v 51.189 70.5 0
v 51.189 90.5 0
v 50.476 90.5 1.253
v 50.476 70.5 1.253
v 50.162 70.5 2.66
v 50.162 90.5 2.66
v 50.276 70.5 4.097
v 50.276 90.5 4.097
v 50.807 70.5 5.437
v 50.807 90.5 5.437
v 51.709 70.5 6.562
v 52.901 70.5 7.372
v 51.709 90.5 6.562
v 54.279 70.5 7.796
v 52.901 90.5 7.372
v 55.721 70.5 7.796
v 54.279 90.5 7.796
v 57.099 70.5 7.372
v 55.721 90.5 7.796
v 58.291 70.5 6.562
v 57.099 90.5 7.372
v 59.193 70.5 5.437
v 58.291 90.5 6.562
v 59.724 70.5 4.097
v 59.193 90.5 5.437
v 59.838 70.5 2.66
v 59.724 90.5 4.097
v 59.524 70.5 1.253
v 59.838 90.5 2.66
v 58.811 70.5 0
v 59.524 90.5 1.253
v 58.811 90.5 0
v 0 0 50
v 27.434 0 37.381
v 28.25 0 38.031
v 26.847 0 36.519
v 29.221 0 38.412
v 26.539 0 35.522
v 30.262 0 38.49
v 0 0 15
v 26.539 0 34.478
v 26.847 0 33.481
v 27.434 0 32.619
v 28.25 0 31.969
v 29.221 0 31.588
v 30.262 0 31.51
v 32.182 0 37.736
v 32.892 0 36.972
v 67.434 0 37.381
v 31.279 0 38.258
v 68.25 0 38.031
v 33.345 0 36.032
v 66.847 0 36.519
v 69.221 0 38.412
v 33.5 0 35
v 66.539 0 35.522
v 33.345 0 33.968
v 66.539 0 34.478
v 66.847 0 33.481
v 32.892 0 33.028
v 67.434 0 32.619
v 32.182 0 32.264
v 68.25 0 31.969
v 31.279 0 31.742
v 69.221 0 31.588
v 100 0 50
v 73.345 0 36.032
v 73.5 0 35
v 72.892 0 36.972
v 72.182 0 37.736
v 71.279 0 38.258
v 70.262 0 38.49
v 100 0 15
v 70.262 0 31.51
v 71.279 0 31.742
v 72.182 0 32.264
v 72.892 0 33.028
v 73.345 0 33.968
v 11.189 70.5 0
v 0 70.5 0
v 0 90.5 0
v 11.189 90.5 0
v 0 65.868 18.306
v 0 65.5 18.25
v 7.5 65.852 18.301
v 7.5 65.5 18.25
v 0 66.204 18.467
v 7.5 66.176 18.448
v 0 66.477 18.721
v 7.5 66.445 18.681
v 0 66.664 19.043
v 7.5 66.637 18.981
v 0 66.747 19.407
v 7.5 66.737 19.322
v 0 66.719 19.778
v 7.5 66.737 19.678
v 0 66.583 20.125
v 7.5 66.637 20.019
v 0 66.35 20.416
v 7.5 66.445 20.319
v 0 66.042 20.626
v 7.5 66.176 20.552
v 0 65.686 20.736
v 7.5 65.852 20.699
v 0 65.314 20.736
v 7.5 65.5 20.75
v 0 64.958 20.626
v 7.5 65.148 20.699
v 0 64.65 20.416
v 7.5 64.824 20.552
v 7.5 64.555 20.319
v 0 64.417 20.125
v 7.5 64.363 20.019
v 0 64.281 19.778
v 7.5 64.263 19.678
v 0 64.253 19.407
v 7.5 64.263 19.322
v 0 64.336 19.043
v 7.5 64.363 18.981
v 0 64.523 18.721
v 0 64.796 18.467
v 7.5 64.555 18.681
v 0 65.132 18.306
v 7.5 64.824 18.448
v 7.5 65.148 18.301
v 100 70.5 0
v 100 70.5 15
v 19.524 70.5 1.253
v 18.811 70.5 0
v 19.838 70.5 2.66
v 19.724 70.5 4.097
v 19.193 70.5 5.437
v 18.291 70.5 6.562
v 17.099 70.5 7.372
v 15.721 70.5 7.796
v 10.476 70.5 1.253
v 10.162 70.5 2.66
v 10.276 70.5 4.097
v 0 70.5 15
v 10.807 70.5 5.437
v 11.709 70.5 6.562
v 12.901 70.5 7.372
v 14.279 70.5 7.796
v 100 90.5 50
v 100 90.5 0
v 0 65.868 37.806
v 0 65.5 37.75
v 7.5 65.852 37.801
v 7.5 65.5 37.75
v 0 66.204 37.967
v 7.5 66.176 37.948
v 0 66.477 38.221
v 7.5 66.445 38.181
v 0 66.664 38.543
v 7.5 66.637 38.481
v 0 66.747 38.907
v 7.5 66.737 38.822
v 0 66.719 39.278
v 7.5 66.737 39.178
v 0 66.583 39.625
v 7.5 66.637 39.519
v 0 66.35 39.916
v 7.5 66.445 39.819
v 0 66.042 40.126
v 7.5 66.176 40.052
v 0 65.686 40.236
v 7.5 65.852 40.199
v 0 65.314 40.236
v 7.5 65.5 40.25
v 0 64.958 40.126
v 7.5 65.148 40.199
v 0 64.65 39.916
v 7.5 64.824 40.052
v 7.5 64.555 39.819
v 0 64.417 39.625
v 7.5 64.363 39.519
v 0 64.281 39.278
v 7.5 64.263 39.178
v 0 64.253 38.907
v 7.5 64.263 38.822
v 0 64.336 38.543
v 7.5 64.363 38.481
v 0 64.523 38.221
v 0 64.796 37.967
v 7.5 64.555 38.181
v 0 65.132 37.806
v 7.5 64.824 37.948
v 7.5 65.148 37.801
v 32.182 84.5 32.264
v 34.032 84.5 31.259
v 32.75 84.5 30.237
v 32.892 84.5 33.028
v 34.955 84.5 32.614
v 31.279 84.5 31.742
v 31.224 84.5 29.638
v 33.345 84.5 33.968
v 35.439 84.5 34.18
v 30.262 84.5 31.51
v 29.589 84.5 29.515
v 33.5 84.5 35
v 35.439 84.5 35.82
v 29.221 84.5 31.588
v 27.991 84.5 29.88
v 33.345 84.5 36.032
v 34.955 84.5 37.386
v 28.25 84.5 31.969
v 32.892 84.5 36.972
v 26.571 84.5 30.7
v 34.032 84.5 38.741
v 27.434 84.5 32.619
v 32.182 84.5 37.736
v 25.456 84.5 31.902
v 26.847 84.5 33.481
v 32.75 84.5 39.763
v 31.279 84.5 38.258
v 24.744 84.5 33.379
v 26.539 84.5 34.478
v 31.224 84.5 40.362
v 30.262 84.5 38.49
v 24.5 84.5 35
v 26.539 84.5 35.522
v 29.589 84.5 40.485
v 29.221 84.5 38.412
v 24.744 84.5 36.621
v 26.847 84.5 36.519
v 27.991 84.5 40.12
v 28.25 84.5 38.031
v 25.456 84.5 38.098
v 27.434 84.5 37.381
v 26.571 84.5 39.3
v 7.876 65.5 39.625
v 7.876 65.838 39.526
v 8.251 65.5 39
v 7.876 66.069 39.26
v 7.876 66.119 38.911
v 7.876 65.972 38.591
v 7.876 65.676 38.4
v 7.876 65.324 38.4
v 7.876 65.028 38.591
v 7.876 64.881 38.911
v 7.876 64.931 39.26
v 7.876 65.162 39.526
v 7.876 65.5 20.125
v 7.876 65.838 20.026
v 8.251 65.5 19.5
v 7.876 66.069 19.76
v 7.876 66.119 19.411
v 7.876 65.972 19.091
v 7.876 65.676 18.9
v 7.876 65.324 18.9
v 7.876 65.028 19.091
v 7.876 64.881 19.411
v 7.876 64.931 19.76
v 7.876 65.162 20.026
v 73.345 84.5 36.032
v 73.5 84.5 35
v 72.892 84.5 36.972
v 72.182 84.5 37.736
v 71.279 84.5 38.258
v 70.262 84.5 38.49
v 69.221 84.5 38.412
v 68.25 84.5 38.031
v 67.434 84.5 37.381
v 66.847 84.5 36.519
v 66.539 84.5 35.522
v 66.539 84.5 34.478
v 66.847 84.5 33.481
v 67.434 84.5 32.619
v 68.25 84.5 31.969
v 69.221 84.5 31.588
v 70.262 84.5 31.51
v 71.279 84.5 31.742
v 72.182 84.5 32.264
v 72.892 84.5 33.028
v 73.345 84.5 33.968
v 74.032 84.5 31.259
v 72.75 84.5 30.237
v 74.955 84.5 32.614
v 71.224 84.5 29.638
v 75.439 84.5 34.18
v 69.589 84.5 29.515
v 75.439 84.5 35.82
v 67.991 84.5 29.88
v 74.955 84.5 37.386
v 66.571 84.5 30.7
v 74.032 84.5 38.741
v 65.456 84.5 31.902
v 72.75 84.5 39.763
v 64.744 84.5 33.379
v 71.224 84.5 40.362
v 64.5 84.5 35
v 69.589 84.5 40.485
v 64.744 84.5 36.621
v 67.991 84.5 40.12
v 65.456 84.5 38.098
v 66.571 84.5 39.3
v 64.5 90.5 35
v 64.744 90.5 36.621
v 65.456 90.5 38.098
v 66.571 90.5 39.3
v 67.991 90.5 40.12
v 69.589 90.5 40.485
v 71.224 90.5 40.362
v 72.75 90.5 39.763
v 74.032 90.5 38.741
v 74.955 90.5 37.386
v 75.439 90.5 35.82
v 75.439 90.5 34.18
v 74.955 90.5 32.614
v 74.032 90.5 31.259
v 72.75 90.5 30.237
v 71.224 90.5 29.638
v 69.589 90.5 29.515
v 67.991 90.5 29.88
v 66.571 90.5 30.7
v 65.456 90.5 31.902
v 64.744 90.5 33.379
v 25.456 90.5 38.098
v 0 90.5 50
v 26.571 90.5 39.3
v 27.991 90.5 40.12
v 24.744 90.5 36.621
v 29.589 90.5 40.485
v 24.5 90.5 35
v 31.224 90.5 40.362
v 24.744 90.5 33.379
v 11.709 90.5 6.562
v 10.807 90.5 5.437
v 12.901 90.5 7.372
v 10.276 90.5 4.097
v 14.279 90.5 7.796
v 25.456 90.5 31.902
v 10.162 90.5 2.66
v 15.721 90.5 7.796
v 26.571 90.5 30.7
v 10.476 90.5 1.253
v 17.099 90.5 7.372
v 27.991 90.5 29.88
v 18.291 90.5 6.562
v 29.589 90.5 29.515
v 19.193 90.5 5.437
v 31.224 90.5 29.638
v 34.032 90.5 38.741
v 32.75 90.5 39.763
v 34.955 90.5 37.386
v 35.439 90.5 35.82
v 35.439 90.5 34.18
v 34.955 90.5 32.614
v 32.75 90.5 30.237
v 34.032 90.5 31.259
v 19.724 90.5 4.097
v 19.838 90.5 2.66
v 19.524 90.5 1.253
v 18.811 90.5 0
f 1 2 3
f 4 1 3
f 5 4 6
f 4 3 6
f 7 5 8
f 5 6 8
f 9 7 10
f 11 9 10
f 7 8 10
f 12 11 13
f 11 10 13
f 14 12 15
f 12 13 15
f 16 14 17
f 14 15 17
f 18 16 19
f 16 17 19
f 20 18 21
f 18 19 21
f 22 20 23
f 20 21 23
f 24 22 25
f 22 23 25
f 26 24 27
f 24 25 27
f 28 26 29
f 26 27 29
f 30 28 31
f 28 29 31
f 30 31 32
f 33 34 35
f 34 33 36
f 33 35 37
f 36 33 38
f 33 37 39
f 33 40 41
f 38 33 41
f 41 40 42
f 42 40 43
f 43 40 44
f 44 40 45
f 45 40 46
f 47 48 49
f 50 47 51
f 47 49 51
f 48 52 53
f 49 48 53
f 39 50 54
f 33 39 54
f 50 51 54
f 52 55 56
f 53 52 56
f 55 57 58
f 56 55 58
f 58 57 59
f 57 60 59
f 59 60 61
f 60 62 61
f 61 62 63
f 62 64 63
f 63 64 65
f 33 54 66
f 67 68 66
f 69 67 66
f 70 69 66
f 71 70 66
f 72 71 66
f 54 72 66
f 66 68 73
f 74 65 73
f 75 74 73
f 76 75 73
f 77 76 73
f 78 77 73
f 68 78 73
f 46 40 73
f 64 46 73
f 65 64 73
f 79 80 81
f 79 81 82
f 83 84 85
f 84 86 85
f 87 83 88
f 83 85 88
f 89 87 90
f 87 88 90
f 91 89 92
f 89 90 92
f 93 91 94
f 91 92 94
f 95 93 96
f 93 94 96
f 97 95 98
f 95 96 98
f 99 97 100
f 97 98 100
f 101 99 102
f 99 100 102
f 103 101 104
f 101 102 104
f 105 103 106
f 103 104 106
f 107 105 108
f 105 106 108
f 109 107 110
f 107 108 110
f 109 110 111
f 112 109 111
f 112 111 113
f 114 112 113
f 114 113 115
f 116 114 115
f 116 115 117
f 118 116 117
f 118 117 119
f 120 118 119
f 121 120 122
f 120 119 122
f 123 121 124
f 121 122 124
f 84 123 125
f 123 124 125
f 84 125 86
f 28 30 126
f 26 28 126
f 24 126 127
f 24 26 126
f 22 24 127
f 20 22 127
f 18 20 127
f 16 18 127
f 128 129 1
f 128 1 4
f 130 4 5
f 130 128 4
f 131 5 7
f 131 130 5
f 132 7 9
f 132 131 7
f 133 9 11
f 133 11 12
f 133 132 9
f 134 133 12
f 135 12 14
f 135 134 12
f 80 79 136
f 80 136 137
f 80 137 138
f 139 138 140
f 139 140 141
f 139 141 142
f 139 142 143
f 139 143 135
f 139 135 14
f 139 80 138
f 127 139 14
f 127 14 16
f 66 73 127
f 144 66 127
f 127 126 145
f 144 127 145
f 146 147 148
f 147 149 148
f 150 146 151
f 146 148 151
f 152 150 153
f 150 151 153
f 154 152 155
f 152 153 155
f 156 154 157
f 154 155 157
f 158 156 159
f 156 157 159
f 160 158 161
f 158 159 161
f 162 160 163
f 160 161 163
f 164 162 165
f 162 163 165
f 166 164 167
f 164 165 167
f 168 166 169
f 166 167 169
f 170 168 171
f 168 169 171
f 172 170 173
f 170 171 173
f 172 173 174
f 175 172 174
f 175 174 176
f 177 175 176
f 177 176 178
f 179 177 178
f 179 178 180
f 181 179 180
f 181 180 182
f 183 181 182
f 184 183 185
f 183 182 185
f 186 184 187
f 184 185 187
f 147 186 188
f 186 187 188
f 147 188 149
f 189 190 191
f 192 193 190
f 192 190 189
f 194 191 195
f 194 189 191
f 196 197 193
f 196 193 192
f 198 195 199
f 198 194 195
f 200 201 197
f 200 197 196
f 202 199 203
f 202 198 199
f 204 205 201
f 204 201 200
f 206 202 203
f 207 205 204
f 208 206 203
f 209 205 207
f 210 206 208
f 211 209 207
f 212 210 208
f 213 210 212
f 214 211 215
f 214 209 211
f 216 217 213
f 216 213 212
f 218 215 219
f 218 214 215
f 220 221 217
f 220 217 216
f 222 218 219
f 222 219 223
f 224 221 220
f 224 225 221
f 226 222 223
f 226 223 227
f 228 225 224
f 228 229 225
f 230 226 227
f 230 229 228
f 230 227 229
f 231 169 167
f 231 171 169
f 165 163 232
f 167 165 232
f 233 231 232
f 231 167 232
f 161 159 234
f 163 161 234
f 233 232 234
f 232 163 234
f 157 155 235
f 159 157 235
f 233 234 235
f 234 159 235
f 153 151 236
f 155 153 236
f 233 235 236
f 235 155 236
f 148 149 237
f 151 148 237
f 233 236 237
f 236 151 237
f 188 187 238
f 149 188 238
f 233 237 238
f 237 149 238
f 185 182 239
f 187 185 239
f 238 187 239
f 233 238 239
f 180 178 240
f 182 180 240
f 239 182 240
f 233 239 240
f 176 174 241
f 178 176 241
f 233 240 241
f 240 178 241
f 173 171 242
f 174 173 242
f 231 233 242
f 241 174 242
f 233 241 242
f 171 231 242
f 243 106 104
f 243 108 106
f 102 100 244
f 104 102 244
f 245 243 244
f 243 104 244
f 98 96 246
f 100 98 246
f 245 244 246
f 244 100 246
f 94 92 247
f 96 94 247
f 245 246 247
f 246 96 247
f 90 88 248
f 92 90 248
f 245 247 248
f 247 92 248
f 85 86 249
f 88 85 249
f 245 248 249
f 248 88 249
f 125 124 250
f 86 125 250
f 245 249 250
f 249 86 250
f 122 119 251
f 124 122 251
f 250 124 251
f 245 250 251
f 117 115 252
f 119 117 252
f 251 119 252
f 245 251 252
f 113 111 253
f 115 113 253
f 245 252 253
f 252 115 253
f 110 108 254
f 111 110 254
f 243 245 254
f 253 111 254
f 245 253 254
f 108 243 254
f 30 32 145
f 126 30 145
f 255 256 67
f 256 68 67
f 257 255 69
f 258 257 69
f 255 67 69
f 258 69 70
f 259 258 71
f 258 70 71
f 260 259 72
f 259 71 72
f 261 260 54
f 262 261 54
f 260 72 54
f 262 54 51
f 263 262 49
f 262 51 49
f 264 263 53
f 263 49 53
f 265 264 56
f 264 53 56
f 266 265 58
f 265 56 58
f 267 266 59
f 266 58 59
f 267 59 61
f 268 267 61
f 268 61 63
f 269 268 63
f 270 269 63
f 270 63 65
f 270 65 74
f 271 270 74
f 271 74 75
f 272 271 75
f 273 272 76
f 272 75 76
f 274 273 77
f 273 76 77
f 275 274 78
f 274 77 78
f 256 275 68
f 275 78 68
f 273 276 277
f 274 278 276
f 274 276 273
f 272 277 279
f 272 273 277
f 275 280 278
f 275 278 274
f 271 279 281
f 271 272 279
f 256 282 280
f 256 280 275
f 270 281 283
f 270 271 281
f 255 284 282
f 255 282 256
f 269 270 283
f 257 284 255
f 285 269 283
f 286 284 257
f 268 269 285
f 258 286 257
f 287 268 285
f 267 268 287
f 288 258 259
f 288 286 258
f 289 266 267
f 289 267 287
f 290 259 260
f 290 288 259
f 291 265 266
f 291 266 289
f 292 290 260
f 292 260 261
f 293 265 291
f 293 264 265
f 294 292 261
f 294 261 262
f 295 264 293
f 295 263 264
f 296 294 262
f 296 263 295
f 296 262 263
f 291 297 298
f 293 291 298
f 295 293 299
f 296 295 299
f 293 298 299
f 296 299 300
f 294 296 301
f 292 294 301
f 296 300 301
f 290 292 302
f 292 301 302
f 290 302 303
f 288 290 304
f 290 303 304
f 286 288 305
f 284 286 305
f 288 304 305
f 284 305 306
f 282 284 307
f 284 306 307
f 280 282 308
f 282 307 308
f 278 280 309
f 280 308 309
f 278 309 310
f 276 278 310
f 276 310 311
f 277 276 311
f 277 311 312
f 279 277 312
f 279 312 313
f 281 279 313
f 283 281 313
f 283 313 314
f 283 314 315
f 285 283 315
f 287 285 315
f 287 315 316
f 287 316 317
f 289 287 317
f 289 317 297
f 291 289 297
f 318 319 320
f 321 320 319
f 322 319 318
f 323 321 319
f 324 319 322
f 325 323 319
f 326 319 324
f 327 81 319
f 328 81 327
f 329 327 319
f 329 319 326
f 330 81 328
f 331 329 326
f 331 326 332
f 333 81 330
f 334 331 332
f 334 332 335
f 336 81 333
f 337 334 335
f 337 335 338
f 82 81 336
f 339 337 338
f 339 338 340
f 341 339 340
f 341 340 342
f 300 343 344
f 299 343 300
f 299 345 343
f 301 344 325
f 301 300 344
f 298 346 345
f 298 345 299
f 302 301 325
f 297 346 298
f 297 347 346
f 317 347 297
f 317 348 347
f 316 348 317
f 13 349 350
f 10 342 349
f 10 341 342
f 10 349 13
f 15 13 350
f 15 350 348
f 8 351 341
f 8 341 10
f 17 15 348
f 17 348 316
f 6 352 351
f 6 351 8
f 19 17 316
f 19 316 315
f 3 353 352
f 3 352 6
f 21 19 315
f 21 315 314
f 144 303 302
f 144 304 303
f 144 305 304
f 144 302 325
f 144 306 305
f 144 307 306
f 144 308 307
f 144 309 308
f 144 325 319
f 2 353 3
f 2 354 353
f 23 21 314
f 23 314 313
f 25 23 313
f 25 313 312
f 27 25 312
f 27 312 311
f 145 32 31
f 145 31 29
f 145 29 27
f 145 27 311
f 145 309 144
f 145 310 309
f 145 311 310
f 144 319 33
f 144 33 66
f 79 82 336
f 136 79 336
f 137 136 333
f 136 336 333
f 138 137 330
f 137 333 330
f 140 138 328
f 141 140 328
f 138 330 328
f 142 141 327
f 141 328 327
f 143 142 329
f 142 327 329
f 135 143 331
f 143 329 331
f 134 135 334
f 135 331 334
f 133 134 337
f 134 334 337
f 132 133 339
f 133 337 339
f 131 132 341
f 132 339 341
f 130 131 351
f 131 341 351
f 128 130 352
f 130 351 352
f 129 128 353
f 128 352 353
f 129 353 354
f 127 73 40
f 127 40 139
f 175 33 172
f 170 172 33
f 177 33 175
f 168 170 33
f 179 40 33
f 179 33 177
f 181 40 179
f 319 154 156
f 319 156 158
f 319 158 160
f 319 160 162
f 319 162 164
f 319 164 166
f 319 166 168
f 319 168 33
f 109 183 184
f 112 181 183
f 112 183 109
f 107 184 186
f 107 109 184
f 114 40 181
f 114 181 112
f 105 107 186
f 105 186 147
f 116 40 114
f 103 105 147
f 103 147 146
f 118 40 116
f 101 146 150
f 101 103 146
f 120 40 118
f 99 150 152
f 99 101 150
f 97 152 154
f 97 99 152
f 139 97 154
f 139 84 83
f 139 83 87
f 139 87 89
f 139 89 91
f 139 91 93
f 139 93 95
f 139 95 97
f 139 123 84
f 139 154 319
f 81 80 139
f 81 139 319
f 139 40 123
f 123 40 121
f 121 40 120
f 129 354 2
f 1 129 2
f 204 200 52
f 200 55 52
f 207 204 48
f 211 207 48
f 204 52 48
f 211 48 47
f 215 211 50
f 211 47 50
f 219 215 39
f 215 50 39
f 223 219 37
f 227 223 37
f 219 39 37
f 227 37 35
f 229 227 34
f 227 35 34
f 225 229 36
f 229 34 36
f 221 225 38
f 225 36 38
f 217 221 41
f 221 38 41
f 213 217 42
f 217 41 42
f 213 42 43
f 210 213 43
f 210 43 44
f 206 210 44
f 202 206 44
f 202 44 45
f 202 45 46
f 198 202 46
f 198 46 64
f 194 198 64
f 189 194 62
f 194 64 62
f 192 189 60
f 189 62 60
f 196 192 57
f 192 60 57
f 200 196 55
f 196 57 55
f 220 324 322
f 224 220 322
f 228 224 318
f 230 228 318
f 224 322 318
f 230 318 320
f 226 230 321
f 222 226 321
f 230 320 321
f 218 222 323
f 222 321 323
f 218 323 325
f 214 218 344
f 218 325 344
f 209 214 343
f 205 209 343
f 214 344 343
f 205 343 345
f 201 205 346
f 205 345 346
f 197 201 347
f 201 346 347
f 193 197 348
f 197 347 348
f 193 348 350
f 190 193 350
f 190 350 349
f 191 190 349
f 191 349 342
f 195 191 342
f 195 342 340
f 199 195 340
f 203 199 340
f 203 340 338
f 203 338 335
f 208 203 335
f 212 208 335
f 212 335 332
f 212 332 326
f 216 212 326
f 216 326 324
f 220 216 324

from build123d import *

# Parameters (mm, degrees)
SKETCH_1_W                   = 100
SKETCH_1_H                   = 90.5
EXTRUDE_1_DEPTH              = 50
SKETCH_2_W                   = 15
SKETCH_2_H                   = 70.5
CUT_EXTRUDE_1_DEPTH          = 144.841058116
SKETCH_4_R                   = 4.85
CUT_EXTRUDE_3_DEPTH          = 144.841058116
HOLE_WIZARD_M6_1_D           = 7
HOLE_WIZARD_M6_1_CBORE_D     = 11
HOLE_WIZARD_M6_1_CBORE_DEPTH = 6
HOLE_WIZARD_M3_1_D           = 2.5
HOLE_WIZARD_M3_1_DEPTH       = 7.5
HOLE_WIZARD_M3_1_TIP         = 0.751075774


with BuildPart() as part:
    # 草图1 → 凸台-拉伸1 (new body)
    with BuildSketch(Plane.XY):
        with Locations((50, 45.25)):
            Rectangle(SKETCH_1_W, SKETCH_1_H)
    extrude(amount=EXTRUDE_1_DEPTH)

    # 草图2 → 切除-拉伸1 (cut, through all)
    with BuildSketch(Plane.ZY):
        with Locations((7.5, 35.25)):
            Rectangle(SKETCH_2_W, SKETCH_2_H)
    extrude(amount=-CUT_EXTRUDE_1_DEPTH, mode=Mode.SUBTRACT)

    # 草图4 → 切除-拉伸3 (cut, through all)
    with BuildSketch(Plane(origin=(0, 90.5, 0), x_dir=(1, 0, 0), z_dir=(0, 1, 0))):
        with Locations((15, -3)):
            Circle(SKETCH_4_R)
        with Locations((55, -3)):
            Circle(SKETCH_4_R)
    extrude(amount=-CUT_EXTRUDE_3_DEPTH, mode=Mode.SUBTRACT)

    # M6 六角凹头螺钉的柱形沉头孔1 (through all)
    with Locations(Plane(origin=(0, 90.5, 0), x_dir=(-1, 0, 0), z_dir=(0, 1, 0))):
        with Locations((-30, 35), (-70, 35)):
            CounterBoreHole(HOLE_WIZARD_M6_1_D / 2, HOLE_WIZARD_M6_1_CBORE_D / 2, HOLE_WIZARD_M6_1_CBORE_DEPTH)

    # M3 螺纹孔1
    with Locations(Plane.ZY):
        with Locations((39, 65.5), (19.5, 65.5)):
            Hole(HOLE_WIZARD_M3_1_D / 2, depth=HOLE_WIZARD_M3_1_DEPTH)
            with Locations((0, 0, -(HOLE_WIZARD_M3_1_DEPTH + HOLE_WIZARD_M3_1_TIP / 2))):  # 118° drill point
                Cone(0, HOLE_WIZARD_M3_1_D / 2, HOLE_WIZARD_M3_1_TIP, mode=Mode.SUBTRACT)


solid = part.part
